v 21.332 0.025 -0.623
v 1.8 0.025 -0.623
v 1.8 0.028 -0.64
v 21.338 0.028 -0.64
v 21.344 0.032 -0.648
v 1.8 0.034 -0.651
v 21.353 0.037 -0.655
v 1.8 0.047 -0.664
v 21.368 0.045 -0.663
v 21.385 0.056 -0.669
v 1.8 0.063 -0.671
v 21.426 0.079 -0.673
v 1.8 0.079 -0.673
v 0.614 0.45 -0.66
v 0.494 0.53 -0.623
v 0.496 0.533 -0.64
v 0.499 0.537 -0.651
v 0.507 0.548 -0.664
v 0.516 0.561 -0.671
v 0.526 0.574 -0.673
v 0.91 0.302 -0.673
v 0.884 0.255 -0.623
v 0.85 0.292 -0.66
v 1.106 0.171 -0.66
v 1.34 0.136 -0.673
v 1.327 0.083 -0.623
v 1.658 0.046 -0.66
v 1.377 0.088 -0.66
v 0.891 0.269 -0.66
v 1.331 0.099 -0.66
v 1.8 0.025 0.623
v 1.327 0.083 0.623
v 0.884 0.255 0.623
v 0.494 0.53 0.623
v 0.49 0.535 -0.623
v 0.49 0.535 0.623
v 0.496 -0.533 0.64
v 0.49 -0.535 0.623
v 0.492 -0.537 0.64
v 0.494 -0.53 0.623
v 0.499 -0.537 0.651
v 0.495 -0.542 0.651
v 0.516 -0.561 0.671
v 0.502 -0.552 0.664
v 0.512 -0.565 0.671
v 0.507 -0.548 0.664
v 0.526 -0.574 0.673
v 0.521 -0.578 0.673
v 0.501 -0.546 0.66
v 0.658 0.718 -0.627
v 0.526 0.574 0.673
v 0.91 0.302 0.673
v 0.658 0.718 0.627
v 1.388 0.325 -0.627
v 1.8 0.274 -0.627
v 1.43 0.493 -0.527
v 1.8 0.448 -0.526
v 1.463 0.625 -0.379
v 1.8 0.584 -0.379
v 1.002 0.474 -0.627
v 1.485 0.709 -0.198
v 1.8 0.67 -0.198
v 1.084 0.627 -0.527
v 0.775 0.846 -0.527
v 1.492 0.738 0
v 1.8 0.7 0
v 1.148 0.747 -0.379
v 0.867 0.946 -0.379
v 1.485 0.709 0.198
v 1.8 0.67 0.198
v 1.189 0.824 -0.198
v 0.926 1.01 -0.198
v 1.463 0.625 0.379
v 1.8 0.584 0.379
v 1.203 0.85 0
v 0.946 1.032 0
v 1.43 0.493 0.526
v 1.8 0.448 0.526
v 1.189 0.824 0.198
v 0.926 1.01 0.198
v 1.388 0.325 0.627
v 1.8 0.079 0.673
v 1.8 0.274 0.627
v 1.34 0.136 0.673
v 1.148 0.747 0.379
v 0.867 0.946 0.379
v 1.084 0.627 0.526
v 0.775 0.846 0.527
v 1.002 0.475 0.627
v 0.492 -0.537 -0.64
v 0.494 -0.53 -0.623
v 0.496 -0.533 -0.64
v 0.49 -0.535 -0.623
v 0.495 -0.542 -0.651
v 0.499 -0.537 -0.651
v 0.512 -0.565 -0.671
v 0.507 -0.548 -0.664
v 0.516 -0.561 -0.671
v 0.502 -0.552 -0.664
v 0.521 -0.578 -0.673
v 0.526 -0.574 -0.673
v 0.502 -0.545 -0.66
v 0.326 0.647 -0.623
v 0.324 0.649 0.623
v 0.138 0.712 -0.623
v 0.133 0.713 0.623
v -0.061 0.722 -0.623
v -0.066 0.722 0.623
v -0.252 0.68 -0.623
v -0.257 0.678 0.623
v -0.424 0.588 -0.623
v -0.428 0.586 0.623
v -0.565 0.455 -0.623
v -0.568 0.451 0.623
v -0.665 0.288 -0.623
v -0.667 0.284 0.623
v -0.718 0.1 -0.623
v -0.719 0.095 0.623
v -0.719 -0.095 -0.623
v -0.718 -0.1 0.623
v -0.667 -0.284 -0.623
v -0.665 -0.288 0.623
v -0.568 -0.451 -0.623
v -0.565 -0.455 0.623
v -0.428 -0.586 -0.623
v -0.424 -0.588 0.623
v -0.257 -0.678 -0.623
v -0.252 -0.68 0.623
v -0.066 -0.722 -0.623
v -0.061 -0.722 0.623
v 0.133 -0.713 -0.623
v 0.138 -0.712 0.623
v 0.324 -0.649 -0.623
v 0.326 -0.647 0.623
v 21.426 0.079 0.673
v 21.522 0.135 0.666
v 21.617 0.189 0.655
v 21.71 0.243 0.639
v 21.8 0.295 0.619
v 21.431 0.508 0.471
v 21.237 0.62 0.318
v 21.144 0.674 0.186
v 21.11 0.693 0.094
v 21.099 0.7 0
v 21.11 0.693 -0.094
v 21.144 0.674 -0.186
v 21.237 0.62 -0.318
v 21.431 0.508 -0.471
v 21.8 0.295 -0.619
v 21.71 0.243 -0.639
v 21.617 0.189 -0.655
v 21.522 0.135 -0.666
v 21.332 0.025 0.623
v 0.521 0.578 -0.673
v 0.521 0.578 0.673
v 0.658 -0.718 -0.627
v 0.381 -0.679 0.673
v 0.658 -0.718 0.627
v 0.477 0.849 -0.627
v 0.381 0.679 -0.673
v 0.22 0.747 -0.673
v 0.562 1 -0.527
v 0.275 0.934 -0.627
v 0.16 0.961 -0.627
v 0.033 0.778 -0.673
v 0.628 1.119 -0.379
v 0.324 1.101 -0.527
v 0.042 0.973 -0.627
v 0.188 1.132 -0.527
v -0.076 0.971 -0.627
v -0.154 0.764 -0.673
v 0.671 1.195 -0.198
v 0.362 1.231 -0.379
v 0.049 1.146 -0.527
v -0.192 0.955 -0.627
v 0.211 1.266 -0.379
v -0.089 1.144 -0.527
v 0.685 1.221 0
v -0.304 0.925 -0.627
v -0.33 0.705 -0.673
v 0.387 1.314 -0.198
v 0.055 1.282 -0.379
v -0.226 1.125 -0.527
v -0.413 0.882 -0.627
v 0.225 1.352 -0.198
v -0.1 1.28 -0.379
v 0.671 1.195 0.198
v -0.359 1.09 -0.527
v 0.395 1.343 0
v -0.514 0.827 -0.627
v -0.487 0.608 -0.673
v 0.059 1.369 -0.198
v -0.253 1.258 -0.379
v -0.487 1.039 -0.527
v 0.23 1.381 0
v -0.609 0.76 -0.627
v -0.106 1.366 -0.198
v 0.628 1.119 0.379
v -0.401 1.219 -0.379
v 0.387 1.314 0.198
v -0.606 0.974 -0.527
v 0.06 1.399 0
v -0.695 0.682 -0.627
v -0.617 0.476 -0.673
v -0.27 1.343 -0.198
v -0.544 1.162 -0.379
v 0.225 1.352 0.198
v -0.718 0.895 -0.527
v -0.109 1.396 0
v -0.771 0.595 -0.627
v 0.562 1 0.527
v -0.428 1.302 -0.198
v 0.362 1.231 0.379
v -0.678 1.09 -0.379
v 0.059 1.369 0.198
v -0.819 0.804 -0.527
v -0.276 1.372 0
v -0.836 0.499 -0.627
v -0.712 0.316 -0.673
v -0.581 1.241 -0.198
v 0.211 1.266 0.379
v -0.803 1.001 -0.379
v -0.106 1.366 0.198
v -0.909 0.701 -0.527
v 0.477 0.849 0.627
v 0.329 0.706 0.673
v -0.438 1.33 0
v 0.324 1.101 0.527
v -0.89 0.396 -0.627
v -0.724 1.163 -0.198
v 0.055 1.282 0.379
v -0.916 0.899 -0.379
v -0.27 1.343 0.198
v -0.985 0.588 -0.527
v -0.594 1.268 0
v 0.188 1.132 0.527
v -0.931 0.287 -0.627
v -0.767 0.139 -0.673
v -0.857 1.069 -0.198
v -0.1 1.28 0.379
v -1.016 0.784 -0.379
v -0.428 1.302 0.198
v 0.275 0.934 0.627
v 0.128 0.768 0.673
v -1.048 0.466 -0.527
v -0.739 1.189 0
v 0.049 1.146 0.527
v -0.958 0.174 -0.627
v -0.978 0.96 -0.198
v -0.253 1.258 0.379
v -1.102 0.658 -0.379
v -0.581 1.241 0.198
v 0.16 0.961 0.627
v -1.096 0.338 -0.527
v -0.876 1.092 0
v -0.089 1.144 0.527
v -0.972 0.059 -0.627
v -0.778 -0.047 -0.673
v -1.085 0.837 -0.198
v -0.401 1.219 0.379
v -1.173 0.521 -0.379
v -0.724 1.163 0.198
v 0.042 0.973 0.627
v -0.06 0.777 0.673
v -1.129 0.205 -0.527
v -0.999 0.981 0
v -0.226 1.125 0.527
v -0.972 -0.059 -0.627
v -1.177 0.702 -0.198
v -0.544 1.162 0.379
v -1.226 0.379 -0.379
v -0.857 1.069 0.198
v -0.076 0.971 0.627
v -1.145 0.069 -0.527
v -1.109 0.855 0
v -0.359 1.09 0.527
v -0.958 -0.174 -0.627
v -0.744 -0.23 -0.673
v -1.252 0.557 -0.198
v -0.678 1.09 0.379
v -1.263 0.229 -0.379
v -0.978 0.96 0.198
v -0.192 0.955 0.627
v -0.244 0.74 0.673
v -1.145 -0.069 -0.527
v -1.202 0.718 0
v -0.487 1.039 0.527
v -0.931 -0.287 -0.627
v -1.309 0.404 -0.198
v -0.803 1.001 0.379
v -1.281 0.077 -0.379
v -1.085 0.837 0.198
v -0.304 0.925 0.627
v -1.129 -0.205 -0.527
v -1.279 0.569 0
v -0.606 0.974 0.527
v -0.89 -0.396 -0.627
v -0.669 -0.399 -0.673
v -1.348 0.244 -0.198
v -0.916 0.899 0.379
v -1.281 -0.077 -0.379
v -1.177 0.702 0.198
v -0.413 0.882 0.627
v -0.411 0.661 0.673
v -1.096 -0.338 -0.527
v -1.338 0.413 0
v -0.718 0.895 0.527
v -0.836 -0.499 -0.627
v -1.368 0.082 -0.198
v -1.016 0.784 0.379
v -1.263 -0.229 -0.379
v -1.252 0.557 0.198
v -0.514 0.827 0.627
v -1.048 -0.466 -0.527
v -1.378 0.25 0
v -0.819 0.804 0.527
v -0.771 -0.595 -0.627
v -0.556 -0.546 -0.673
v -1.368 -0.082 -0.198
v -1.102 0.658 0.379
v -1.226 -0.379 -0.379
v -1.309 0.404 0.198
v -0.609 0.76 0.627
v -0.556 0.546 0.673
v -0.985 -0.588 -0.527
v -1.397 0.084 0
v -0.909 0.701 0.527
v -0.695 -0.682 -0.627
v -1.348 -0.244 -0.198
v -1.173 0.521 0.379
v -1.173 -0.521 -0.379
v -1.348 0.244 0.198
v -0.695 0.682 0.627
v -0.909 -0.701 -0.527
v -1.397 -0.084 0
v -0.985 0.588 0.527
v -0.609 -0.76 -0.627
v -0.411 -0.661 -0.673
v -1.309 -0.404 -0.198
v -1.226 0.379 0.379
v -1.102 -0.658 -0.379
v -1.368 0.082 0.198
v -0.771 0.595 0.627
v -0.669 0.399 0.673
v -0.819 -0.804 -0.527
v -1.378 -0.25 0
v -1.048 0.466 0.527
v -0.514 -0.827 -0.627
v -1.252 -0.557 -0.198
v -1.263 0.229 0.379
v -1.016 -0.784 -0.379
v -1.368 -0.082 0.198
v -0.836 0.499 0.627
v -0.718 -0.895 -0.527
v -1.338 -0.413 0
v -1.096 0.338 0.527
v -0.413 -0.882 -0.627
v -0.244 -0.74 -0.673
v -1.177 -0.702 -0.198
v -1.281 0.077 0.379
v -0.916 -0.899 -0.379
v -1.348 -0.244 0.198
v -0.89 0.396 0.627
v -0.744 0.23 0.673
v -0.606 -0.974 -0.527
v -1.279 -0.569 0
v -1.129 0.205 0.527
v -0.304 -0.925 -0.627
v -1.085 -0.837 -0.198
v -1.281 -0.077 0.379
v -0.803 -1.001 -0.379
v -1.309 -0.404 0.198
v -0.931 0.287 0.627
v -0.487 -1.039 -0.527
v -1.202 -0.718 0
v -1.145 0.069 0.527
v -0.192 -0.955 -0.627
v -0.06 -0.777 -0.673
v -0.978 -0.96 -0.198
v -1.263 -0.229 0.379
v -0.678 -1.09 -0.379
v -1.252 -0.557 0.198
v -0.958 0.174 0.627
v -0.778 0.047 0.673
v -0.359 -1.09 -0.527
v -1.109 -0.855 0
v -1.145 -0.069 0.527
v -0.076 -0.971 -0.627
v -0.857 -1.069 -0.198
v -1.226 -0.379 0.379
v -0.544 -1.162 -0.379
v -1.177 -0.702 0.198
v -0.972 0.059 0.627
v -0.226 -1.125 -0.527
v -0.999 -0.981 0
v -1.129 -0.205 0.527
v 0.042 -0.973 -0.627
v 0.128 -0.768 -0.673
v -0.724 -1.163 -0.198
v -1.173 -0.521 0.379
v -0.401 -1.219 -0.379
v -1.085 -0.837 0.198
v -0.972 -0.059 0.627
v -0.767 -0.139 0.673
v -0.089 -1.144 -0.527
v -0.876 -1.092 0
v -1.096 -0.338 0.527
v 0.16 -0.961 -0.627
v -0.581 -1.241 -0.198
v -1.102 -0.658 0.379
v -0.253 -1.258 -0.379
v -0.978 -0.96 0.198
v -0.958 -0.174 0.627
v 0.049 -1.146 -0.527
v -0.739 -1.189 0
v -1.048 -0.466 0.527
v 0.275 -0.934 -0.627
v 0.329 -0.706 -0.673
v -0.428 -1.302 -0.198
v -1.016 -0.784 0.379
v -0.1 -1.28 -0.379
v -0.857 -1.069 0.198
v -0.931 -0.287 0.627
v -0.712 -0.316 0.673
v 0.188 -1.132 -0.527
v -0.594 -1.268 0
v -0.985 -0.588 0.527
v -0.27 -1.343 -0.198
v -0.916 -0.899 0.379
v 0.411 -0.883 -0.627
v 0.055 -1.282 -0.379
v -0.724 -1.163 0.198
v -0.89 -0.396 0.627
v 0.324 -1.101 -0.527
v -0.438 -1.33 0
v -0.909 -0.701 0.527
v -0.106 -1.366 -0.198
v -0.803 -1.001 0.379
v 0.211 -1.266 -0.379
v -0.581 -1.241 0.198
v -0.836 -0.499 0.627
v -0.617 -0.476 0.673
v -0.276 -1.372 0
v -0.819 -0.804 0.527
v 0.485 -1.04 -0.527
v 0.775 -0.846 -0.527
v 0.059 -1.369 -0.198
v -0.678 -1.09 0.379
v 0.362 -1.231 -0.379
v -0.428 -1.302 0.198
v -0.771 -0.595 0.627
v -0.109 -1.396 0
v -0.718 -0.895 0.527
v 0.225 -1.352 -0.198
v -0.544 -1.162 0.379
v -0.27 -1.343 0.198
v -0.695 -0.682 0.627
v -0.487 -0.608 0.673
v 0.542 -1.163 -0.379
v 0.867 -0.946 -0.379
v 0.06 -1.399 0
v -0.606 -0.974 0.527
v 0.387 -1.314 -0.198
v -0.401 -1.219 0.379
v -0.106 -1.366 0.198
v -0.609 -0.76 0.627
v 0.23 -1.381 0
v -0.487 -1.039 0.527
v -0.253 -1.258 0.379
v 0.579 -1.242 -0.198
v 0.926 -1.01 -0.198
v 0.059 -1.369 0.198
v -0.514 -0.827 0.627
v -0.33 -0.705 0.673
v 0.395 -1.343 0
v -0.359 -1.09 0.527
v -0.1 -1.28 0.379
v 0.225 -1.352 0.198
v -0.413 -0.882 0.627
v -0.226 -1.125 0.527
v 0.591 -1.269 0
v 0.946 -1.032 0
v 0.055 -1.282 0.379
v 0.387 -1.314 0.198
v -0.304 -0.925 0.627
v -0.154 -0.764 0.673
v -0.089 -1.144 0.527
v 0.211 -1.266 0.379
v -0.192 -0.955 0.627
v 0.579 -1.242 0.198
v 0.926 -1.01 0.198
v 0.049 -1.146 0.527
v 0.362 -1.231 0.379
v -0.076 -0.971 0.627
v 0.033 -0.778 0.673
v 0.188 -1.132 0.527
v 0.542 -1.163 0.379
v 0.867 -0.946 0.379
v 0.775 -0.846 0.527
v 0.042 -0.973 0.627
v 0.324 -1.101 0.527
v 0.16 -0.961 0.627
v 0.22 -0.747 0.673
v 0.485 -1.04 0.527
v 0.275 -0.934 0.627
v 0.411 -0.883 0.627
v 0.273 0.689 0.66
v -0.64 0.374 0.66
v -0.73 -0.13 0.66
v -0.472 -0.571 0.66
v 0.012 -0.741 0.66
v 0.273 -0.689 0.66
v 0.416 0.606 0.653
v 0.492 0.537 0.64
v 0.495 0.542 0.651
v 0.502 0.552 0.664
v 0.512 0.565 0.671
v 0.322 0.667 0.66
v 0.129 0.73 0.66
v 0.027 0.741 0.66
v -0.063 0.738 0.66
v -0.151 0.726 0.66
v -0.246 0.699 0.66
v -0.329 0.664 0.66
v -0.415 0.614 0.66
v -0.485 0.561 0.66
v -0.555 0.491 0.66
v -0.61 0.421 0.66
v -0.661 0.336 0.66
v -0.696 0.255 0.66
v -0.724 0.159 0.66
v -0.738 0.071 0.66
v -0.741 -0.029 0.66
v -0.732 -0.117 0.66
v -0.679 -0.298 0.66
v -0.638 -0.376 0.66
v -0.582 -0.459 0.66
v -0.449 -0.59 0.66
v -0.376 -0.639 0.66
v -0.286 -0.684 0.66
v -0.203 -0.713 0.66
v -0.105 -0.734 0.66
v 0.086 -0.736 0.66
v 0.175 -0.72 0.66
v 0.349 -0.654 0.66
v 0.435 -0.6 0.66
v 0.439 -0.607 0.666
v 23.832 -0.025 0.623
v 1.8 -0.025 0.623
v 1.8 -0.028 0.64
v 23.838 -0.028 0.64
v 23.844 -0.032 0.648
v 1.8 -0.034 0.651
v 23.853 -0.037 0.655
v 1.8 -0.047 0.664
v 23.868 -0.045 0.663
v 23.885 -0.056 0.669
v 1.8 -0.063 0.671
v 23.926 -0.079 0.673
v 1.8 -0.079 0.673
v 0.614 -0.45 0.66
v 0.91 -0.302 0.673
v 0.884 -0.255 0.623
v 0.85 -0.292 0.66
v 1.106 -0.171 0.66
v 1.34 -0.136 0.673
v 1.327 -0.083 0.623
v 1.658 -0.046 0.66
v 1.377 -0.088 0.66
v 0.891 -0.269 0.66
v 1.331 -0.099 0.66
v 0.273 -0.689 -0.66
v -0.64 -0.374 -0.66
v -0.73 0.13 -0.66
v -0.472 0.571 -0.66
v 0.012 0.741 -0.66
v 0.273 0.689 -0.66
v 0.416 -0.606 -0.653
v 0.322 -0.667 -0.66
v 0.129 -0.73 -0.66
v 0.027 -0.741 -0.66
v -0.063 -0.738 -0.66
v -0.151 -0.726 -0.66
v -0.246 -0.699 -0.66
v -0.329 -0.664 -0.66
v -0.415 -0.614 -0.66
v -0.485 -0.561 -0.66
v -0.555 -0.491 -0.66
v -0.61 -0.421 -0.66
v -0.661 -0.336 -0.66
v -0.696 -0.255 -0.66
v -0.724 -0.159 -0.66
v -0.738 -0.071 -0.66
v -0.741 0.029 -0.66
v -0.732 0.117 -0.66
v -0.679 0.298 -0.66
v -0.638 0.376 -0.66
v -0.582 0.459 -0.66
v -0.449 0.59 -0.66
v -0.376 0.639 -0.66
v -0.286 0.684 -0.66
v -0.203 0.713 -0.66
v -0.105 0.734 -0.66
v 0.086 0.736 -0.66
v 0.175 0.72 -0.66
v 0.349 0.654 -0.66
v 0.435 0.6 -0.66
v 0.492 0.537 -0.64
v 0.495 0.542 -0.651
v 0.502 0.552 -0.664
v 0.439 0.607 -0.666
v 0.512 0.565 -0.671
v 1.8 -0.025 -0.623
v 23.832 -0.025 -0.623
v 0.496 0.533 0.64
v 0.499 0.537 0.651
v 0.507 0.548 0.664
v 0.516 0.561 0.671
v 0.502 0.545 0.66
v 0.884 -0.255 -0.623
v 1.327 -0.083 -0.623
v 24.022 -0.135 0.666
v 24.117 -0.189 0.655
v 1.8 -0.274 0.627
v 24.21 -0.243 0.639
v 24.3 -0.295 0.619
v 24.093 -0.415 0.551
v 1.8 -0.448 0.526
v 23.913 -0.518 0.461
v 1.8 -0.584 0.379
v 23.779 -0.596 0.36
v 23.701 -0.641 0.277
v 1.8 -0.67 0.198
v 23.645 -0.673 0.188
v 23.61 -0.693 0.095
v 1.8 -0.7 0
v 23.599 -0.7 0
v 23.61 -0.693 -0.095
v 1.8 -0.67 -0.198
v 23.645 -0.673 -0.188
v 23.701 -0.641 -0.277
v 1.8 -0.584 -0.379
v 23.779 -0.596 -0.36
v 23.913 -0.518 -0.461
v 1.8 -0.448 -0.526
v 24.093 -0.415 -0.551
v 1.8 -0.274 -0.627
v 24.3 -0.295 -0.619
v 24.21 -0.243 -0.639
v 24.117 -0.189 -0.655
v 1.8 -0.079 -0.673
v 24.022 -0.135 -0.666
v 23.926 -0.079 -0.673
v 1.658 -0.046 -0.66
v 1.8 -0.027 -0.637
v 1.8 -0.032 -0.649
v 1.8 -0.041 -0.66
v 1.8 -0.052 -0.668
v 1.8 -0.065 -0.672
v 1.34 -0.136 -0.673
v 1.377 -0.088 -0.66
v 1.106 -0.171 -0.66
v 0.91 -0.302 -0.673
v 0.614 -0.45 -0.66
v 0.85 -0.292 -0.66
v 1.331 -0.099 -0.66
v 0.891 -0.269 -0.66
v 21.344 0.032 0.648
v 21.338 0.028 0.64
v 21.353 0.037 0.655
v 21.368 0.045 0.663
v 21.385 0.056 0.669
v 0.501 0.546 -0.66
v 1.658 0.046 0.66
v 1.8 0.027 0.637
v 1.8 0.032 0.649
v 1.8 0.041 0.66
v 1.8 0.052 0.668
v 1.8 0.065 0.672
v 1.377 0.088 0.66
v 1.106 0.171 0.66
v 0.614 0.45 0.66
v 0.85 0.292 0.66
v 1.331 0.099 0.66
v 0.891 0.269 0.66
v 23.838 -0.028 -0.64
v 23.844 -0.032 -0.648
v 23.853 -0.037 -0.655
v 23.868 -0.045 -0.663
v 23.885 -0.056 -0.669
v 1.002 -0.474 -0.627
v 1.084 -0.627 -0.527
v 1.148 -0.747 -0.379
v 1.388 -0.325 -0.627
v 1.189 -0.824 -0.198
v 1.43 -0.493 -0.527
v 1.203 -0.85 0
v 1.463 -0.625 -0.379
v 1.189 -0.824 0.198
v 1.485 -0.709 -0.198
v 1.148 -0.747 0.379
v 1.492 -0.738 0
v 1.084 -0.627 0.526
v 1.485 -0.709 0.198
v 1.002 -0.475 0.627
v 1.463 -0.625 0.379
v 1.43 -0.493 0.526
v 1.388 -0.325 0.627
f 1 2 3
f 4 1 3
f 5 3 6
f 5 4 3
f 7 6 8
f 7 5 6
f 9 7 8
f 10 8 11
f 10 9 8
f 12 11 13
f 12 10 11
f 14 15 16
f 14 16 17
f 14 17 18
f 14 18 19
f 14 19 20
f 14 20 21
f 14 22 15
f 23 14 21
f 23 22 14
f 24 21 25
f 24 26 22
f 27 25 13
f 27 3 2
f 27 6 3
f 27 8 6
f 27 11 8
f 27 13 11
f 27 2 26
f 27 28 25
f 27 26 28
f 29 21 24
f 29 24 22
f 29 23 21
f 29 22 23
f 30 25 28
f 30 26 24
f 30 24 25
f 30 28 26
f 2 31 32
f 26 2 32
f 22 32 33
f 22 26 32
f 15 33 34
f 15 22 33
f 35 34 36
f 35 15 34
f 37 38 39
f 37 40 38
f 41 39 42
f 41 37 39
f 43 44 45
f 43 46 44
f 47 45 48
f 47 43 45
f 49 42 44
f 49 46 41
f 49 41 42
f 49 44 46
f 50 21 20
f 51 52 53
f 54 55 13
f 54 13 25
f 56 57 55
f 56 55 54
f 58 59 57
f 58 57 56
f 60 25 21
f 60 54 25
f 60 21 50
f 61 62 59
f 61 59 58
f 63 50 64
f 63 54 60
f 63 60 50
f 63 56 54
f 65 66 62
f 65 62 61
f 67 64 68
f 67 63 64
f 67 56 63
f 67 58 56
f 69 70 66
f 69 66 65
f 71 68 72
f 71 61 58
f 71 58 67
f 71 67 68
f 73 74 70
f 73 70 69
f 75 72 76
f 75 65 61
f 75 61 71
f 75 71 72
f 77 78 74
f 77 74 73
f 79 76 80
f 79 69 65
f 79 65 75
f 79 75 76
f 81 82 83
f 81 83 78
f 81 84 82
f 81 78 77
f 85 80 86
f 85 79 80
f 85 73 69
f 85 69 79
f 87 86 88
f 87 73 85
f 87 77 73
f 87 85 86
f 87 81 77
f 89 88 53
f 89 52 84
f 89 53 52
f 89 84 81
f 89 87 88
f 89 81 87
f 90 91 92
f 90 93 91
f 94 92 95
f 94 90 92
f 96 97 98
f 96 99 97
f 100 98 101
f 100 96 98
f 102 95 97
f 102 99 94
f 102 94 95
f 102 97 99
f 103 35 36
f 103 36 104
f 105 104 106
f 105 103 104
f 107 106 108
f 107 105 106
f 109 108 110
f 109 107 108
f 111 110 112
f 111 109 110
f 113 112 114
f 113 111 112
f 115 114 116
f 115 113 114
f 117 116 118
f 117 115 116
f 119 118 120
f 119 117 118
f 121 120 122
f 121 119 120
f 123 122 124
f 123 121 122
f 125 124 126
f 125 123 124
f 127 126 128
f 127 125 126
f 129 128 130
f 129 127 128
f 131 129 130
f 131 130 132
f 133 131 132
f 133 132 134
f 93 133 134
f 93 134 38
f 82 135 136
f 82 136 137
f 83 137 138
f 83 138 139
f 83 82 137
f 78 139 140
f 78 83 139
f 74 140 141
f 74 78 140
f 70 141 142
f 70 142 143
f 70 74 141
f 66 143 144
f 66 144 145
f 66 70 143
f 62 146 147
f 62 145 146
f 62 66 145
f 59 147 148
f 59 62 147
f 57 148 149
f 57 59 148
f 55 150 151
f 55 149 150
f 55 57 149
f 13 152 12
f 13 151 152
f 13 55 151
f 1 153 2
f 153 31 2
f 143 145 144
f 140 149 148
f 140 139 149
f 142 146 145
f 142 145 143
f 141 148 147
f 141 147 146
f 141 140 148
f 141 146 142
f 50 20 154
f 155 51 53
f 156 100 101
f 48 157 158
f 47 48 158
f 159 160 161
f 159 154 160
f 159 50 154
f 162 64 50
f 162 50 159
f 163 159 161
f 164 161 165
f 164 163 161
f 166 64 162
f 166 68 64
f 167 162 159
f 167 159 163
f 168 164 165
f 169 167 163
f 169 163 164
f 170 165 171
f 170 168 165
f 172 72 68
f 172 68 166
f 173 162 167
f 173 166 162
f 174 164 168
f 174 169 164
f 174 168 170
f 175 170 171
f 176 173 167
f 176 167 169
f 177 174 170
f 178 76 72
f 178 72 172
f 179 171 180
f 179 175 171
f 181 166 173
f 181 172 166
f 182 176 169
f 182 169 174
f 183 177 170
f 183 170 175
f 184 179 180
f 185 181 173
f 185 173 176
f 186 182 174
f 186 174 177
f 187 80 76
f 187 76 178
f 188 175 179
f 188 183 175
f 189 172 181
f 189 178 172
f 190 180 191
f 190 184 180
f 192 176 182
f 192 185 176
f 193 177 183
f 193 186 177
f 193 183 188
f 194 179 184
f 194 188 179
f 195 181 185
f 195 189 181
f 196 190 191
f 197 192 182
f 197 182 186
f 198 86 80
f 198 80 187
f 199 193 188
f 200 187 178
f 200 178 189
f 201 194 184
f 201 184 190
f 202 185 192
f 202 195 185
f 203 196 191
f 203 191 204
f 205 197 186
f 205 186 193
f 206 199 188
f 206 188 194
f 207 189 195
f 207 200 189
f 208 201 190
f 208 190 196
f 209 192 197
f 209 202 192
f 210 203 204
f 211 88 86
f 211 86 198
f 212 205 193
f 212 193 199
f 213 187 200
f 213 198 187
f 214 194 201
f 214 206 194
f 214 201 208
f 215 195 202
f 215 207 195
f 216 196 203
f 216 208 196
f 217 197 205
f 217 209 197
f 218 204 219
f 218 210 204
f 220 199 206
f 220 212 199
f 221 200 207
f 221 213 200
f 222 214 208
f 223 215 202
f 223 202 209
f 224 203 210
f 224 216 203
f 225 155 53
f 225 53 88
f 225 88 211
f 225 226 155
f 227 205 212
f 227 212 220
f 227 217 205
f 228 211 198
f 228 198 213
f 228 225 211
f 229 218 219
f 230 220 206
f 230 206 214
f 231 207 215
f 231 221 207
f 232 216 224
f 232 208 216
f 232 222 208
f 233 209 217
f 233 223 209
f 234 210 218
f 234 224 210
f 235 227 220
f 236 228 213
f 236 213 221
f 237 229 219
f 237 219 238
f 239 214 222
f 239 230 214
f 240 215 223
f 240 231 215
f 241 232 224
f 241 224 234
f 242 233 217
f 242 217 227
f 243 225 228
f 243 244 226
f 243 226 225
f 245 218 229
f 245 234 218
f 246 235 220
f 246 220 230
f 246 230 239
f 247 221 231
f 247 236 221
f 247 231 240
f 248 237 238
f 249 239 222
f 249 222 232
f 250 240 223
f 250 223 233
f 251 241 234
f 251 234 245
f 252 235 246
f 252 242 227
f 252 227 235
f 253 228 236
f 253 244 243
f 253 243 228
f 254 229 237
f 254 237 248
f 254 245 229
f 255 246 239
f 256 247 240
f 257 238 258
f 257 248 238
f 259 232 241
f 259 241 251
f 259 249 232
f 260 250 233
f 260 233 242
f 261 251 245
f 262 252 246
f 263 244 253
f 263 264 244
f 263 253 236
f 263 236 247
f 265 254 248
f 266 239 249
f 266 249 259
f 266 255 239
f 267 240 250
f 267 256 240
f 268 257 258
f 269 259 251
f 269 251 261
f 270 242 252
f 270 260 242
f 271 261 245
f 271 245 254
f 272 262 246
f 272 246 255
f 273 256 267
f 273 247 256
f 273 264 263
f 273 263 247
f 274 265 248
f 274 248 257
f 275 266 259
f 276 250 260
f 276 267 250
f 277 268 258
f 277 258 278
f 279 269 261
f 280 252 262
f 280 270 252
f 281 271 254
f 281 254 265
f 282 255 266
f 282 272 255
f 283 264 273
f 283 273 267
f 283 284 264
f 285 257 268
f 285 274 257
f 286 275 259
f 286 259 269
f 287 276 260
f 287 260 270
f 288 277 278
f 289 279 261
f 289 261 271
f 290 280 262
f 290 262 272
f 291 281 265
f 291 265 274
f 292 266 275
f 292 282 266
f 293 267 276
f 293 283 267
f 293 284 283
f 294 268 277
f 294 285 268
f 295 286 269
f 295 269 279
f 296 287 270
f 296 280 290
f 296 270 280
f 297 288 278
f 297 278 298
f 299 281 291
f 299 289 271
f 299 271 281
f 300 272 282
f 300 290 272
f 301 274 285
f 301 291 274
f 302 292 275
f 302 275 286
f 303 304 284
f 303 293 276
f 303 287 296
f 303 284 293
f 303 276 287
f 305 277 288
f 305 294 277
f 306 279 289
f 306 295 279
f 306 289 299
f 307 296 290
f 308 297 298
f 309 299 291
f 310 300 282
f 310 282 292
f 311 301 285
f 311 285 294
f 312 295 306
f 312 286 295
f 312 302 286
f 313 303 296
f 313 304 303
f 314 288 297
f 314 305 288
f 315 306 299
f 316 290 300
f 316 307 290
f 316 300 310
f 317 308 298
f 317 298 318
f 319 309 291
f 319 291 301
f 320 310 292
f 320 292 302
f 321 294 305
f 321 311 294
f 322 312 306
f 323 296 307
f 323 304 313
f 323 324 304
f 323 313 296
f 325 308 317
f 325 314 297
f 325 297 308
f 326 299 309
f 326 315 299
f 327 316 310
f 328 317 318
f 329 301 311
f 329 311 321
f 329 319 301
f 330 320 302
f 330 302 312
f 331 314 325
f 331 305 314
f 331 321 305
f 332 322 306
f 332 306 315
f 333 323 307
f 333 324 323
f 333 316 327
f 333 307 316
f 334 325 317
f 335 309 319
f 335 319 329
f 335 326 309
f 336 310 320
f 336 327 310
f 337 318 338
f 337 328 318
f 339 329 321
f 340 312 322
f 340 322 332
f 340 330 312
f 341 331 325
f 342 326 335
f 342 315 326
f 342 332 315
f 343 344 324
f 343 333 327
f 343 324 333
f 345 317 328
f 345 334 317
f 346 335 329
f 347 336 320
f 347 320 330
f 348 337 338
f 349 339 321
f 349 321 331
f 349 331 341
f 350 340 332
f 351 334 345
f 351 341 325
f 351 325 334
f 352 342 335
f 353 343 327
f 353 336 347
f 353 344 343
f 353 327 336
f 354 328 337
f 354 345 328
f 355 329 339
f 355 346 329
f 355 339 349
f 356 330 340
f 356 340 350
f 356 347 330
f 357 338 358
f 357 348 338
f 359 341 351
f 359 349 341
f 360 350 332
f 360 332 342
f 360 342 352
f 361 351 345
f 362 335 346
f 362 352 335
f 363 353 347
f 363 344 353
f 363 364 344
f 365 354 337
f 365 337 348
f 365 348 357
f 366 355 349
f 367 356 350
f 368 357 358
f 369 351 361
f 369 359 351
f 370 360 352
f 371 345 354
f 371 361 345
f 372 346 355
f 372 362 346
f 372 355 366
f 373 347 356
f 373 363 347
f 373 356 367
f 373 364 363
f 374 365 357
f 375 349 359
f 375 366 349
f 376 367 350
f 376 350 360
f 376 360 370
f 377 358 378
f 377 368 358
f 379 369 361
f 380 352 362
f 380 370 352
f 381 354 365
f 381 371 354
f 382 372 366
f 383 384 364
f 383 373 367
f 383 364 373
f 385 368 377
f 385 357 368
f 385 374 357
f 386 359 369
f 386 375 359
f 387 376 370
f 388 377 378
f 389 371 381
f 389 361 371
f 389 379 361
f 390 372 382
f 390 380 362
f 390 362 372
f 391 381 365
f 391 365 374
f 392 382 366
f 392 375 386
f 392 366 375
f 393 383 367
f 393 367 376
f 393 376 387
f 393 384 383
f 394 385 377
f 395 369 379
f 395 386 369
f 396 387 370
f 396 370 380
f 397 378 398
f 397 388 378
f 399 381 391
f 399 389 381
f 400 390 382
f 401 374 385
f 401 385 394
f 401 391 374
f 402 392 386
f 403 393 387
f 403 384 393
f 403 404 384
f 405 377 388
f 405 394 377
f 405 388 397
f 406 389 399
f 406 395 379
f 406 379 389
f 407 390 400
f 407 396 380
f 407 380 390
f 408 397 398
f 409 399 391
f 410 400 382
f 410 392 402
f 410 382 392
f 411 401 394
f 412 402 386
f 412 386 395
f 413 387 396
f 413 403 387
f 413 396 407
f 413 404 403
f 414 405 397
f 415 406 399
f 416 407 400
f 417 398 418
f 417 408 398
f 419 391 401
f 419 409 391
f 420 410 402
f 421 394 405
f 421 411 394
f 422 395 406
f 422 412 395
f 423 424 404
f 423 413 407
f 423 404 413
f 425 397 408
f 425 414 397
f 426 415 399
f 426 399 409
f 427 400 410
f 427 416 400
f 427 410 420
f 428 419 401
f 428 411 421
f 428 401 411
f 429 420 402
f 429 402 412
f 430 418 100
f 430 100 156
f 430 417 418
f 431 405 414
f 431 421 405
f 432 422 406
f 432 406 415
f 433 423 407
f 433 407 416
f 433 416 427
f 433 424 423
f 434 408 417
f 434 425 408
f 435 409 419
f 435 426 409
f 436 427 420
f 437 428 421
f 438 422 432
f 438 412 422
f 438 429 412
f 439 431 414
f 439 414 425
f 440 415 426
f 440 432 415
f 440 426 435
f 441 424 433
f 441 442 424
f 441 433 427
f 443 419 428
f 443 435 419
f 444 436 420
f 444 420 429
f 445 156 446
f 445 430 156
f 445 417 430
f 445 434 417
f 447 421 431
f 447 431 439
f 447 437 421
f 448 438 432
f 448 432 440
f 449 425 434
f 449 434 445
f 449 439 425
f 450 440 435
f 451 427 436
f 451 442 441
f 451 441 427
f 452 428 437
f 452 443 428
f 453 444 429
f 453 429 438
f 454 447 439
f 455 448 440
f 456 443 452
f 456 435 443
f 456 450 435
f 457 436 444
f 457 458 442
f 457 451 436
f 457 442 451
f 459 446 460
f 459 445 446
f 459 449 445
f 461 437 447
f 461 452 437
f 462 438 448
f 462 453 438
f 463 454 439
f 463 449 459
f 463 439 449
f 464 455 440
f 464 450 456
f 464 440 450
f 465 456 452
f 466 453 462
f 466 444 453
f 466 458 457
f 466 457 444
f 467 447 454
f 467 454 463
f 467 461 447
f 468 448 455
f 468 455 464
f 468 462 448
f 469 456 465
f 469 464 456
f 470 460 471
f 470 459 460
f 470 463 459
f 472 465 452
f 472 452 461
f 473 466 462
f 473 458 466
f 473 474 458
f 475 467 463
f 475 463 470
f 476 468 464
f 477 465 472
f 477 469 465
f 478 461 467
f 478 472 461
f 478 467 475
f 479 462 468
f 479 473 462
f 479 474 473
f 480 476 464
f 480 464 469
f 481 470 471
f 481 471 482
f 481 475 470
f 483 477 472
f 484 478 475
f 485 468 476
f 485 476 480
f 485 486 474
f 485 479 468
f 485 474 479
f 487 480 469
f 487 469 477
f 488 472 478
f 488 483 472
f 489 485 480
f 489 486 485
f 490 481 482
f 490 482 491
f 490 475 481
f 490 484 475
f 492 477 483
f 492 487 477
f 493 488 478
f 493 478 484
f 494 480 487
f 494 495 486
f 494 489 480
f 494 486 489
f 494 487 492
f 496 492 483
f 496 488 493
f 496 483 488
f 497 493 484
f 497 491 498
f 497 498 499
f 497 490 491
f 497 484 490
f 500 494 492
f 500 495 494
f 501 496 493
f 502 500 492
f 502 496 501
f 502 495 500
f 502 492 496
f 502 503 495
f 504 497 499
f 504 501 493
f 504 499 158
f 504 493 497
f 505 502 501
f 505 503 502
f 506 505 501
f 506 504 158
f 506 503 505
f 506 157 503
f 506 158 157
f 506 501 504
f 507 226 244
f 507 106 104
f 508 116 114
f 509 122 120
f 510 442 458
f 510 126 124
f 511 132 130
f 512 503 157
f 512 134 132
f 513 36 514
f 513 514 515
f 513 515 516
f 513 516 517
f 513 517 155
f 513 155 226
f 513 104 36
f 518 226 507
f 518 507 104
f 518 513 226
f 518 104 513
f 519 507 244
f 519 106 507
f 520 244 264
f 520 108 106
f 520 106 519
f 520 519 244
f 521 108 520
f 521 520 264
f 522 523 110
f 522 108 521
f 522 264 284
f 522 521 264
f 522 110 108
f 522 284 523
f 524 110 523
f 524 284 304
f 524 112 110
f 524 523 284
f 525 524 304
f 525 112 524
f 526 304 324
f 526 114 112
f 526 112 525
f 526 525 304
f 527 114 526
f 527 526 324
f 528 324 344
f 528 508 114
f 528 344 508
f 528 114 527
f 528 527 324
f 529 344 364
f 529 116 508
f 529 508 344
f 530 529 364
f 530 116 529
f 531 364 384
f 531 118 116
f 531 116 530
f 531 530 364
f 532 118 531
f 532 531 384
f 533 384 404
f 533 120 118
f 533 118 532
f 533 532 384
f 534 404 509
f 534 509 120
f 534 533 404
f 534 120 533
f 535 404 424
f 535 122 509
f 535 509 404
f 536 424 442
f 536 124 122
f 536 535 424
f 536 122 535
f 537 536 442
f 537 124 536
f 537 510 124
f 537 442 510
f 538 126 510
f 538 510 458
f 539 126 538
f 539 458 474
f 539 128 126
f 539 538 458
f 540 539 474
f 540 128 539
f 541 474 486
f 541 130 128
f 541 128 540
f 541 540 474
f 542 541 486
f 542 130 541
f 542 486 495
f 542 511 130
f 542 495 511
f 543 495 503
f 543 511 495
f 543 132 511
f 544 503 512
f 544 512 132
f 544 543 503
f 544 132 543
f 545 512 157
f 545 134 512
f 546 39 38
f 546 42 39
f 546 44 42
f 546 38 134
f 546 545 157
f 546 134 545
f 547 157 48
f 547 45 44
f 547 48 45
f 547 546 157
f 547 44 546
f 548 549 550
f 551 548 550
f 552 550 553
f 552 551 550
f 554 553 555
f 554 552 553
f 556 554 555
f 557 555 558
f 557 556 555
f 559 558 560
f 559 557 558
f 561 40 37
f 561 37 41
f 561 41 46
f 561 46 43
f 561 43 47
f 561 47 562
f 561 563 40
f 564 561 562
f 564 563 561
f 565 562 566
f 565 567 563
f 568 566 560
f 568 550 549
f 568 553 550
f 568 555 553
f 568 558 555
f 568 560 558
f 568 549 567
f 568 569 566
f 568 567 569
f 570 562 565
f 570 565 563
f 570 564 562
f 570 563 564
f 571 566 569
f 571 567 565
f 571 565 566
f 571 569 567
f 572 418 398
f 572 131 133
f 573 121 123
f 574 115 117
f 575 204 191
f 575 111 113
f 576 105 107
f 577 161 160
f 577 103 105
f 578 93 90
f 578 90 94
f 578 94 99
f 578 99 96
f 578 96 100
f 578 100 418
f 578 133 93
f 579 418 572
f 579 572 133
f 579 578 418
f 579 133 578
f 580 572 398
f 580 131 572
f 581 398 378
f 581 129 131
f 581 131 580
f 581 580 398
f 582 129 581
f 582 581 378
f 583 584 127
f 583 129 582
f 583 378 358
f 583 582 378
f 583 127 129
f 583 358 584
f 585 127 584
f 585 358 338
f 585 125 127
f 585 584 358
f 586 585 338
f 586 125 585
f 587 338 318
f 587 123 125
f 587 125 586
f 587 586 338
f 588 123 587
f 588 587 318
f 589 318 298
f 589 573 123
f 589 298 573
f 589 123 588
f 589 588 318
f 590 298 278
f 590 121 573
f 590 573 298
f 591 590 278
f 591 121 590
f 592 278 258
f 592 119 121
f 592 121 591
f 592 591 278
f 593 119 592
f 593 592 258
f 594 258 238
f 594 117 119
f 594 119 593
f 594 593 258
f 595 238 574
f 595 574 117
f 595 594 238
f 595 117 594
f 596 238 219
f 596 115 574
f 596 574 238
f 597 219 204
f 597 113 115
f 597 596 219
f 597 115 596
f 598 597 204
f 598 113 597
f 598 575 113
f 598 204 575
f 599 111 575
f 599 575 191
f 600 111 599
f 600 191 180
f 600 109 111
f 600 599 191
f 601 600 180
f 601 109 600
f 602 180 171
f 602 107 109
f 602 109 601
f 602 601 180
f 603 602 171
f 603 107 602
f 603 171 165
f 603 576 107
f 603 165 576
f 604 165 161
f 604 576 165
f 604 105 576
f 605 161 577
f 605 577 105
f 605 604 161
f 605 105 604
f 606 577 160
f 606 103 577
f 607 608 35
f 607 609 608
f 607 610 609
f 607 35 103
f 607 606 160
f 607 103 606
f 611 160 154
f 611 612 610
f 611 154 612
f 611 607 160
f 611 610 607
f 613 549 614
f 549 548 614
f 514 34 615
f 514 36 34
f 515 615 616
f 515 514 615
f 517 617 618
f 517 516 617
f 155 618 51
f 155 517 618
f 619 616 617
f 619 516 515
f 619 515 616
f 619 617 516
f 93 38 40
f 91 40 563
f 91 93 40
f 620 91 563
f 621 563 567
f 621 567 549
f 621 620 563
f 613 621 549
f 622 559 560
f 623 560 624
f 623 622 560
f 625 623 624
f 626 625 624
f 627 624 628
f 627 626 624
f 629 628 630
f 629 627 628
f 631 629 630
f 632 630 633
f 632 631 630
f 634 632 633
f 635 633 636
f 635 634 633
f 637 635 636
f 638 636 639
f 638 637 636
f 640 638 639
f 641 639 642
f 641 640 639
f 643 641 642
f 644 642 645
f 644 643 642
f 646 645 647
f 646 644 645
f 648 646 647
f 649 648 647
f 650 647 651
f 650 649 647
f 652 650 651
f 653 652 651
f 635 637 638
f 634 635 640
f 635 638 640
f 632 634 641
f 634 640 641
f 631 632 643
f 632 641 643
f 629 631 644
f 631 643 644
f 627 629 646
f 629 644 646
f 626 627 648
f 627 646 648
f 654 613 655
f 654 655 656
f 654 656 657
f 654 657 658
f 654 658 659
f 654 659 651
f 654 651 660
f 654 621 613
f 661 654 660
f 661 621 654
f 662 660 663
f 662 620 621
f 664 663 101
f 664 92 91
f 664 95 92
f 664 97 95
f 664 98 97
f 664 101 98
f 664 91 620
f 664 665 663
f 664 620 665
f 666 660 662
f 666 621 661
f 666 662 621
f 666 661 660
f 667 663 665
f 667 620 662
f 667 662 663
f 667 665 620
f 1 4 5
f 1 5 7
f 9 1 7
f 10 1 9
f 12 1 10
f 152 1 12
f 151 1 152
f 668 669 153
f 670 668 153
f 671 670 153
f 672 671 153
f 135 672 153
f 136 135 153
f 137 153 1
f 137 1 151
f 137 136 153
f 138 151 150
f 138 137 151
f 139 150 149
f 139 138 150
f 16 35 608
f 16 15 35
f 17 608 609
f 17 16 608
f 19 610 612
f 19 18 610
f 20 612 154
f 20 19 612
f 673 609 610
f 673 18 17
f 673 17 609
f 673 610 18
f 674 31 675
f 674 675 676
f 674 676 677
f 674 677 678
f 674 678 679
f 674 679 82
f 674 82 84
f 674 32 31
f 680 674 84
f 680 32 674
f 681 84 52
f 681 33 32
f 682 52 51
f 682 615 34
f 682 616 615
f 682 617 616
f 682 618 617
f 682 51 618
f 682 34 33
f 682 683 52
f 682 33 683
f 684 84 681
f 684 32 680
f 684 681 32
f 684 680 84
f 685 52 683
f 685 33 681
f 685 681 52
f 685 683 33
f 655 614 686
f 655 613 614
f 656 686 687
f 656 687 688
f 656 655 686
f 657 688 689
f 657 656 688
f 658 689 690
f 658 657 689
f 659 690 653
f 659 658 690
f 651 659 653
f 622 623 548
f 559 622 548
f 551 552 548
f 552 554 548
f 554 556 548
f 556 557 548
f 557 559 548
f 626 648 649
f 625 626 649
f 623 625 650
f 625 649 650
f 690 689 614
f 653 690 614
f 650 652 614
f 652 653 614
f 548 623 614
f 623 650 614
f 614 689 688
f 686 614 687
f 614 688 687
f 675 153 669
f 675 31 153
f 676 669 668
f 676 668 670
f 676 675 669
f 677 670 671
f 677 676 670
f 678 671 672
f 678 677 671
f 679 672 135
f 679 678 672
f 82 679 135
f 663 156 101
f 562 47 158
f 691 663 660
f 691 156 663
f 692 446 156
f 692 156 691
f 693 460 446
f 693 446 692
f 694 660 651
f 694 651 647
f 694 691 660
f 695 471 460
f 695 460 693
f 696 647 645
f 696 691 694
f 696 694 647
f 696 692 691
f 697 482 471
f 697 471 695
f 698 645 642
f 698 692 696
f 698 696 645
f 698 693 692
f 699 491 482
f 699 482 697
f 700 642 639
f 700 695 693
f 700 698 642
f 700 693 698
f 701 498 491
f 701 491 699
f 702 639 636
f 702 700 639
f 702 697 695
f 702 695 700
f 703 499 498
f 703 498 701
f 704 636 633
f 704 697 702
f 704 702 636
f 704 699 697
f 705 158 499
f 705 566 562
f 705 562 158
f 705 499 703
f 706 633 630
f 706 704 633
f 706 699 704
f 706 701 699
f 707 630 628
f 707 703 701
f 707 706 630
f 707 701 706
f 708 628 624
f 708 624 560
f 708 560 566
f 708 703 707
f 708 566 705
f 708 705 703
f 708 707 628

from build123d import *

# Parameters (mm, degrees)
CUT_EXTRUDE1_DEPTH      = 1.6750001
CUT_EXTRUDE1_DEPTH_BACK = 1.6750001
FILLET1_R               = 0.05


with BuildPart() as part:
    # Sweep1: sweep along a path in Sketch1
    with BuildLine(Plane.XY) as sweep1_path:
        Line((21.8, 0.7), (1.8, 0.7))
        ThreePointArc((1.8, 0.7), (1.34176437, 0.785965522), (0.945844504, 1.032171582))
        ThreePointArc((0.945844504, 1.032171582), (-1.4, 0), (0.945844504, -1.032171582))
        ThreePointArc((0.945844504, -1.032171582), (1.34176437, -0.785965522), (1.8, -0.7))
        Line((1.8, -0.7), (24.3, -0.7))
    # Sketch2 → Sweep1 (sweep)
    with BuildSketch(Plane(origin=(21.8, 0, 0), x_dir=(0, 0, -1), z_dir=(1, 0, 0))):
        with BuildLine():
            Line((0.675, 0.025), (-0.675, 0.025))
            ThreePointArc((-0.675, 0.025), (0, 0.7), (0.675, 0.025))
        make_face()
    sweep(path=sweep1_path.line)

    # Sketch3 → Cut-Extrude1 (cut, two sides)
    with BuildSketch(Plane.XY) as cut_extrude1_sk:
        Polygon((21.332346282, 0.025), (21.8, 0.295), (21.098519423, 0.7), (25.3, 0.7), (25.3, -0.7), (23.598519423, -0.7), (24.3, -0.295), (23.832346282, -0.025), (21.8, -0.025), (21.8, 0.025), align=None)
    extrude(amount=CUT_EXTRUDE1_DEPTH, mode=Mode.SUBTRACT)
    extrude(cut_extrude1_sk.sketch, amount=-CUT_EXTRUDE1_DEPTH_BACK, mode=Mode.SUBTRACT)

    # Fillet1
    fillet1_edges = [part.edges().sort_by_distance(p)[0] for p in [
        (12.816173141, -0.025, 0.675),
        (12.816173141, -0.025, -0.675),
        (1.097113144, -0.156862369, -0.675),
        (1.097113144, -0.156862369, 0.675),
        (-0.725, 0, -0.675),
        (-0.725, 0, 0.675),
        (1.097113144, 0.156862369, -0.675),
        (1.097113144, 0.156862369, 0.675),
        (11.566173141, 0.025, -0.675),
        (11.566173141, 0.025, 0.675),
    ]]
    fillet(fillet1_edges, radius=FILLET1_R)


solid = part.part
